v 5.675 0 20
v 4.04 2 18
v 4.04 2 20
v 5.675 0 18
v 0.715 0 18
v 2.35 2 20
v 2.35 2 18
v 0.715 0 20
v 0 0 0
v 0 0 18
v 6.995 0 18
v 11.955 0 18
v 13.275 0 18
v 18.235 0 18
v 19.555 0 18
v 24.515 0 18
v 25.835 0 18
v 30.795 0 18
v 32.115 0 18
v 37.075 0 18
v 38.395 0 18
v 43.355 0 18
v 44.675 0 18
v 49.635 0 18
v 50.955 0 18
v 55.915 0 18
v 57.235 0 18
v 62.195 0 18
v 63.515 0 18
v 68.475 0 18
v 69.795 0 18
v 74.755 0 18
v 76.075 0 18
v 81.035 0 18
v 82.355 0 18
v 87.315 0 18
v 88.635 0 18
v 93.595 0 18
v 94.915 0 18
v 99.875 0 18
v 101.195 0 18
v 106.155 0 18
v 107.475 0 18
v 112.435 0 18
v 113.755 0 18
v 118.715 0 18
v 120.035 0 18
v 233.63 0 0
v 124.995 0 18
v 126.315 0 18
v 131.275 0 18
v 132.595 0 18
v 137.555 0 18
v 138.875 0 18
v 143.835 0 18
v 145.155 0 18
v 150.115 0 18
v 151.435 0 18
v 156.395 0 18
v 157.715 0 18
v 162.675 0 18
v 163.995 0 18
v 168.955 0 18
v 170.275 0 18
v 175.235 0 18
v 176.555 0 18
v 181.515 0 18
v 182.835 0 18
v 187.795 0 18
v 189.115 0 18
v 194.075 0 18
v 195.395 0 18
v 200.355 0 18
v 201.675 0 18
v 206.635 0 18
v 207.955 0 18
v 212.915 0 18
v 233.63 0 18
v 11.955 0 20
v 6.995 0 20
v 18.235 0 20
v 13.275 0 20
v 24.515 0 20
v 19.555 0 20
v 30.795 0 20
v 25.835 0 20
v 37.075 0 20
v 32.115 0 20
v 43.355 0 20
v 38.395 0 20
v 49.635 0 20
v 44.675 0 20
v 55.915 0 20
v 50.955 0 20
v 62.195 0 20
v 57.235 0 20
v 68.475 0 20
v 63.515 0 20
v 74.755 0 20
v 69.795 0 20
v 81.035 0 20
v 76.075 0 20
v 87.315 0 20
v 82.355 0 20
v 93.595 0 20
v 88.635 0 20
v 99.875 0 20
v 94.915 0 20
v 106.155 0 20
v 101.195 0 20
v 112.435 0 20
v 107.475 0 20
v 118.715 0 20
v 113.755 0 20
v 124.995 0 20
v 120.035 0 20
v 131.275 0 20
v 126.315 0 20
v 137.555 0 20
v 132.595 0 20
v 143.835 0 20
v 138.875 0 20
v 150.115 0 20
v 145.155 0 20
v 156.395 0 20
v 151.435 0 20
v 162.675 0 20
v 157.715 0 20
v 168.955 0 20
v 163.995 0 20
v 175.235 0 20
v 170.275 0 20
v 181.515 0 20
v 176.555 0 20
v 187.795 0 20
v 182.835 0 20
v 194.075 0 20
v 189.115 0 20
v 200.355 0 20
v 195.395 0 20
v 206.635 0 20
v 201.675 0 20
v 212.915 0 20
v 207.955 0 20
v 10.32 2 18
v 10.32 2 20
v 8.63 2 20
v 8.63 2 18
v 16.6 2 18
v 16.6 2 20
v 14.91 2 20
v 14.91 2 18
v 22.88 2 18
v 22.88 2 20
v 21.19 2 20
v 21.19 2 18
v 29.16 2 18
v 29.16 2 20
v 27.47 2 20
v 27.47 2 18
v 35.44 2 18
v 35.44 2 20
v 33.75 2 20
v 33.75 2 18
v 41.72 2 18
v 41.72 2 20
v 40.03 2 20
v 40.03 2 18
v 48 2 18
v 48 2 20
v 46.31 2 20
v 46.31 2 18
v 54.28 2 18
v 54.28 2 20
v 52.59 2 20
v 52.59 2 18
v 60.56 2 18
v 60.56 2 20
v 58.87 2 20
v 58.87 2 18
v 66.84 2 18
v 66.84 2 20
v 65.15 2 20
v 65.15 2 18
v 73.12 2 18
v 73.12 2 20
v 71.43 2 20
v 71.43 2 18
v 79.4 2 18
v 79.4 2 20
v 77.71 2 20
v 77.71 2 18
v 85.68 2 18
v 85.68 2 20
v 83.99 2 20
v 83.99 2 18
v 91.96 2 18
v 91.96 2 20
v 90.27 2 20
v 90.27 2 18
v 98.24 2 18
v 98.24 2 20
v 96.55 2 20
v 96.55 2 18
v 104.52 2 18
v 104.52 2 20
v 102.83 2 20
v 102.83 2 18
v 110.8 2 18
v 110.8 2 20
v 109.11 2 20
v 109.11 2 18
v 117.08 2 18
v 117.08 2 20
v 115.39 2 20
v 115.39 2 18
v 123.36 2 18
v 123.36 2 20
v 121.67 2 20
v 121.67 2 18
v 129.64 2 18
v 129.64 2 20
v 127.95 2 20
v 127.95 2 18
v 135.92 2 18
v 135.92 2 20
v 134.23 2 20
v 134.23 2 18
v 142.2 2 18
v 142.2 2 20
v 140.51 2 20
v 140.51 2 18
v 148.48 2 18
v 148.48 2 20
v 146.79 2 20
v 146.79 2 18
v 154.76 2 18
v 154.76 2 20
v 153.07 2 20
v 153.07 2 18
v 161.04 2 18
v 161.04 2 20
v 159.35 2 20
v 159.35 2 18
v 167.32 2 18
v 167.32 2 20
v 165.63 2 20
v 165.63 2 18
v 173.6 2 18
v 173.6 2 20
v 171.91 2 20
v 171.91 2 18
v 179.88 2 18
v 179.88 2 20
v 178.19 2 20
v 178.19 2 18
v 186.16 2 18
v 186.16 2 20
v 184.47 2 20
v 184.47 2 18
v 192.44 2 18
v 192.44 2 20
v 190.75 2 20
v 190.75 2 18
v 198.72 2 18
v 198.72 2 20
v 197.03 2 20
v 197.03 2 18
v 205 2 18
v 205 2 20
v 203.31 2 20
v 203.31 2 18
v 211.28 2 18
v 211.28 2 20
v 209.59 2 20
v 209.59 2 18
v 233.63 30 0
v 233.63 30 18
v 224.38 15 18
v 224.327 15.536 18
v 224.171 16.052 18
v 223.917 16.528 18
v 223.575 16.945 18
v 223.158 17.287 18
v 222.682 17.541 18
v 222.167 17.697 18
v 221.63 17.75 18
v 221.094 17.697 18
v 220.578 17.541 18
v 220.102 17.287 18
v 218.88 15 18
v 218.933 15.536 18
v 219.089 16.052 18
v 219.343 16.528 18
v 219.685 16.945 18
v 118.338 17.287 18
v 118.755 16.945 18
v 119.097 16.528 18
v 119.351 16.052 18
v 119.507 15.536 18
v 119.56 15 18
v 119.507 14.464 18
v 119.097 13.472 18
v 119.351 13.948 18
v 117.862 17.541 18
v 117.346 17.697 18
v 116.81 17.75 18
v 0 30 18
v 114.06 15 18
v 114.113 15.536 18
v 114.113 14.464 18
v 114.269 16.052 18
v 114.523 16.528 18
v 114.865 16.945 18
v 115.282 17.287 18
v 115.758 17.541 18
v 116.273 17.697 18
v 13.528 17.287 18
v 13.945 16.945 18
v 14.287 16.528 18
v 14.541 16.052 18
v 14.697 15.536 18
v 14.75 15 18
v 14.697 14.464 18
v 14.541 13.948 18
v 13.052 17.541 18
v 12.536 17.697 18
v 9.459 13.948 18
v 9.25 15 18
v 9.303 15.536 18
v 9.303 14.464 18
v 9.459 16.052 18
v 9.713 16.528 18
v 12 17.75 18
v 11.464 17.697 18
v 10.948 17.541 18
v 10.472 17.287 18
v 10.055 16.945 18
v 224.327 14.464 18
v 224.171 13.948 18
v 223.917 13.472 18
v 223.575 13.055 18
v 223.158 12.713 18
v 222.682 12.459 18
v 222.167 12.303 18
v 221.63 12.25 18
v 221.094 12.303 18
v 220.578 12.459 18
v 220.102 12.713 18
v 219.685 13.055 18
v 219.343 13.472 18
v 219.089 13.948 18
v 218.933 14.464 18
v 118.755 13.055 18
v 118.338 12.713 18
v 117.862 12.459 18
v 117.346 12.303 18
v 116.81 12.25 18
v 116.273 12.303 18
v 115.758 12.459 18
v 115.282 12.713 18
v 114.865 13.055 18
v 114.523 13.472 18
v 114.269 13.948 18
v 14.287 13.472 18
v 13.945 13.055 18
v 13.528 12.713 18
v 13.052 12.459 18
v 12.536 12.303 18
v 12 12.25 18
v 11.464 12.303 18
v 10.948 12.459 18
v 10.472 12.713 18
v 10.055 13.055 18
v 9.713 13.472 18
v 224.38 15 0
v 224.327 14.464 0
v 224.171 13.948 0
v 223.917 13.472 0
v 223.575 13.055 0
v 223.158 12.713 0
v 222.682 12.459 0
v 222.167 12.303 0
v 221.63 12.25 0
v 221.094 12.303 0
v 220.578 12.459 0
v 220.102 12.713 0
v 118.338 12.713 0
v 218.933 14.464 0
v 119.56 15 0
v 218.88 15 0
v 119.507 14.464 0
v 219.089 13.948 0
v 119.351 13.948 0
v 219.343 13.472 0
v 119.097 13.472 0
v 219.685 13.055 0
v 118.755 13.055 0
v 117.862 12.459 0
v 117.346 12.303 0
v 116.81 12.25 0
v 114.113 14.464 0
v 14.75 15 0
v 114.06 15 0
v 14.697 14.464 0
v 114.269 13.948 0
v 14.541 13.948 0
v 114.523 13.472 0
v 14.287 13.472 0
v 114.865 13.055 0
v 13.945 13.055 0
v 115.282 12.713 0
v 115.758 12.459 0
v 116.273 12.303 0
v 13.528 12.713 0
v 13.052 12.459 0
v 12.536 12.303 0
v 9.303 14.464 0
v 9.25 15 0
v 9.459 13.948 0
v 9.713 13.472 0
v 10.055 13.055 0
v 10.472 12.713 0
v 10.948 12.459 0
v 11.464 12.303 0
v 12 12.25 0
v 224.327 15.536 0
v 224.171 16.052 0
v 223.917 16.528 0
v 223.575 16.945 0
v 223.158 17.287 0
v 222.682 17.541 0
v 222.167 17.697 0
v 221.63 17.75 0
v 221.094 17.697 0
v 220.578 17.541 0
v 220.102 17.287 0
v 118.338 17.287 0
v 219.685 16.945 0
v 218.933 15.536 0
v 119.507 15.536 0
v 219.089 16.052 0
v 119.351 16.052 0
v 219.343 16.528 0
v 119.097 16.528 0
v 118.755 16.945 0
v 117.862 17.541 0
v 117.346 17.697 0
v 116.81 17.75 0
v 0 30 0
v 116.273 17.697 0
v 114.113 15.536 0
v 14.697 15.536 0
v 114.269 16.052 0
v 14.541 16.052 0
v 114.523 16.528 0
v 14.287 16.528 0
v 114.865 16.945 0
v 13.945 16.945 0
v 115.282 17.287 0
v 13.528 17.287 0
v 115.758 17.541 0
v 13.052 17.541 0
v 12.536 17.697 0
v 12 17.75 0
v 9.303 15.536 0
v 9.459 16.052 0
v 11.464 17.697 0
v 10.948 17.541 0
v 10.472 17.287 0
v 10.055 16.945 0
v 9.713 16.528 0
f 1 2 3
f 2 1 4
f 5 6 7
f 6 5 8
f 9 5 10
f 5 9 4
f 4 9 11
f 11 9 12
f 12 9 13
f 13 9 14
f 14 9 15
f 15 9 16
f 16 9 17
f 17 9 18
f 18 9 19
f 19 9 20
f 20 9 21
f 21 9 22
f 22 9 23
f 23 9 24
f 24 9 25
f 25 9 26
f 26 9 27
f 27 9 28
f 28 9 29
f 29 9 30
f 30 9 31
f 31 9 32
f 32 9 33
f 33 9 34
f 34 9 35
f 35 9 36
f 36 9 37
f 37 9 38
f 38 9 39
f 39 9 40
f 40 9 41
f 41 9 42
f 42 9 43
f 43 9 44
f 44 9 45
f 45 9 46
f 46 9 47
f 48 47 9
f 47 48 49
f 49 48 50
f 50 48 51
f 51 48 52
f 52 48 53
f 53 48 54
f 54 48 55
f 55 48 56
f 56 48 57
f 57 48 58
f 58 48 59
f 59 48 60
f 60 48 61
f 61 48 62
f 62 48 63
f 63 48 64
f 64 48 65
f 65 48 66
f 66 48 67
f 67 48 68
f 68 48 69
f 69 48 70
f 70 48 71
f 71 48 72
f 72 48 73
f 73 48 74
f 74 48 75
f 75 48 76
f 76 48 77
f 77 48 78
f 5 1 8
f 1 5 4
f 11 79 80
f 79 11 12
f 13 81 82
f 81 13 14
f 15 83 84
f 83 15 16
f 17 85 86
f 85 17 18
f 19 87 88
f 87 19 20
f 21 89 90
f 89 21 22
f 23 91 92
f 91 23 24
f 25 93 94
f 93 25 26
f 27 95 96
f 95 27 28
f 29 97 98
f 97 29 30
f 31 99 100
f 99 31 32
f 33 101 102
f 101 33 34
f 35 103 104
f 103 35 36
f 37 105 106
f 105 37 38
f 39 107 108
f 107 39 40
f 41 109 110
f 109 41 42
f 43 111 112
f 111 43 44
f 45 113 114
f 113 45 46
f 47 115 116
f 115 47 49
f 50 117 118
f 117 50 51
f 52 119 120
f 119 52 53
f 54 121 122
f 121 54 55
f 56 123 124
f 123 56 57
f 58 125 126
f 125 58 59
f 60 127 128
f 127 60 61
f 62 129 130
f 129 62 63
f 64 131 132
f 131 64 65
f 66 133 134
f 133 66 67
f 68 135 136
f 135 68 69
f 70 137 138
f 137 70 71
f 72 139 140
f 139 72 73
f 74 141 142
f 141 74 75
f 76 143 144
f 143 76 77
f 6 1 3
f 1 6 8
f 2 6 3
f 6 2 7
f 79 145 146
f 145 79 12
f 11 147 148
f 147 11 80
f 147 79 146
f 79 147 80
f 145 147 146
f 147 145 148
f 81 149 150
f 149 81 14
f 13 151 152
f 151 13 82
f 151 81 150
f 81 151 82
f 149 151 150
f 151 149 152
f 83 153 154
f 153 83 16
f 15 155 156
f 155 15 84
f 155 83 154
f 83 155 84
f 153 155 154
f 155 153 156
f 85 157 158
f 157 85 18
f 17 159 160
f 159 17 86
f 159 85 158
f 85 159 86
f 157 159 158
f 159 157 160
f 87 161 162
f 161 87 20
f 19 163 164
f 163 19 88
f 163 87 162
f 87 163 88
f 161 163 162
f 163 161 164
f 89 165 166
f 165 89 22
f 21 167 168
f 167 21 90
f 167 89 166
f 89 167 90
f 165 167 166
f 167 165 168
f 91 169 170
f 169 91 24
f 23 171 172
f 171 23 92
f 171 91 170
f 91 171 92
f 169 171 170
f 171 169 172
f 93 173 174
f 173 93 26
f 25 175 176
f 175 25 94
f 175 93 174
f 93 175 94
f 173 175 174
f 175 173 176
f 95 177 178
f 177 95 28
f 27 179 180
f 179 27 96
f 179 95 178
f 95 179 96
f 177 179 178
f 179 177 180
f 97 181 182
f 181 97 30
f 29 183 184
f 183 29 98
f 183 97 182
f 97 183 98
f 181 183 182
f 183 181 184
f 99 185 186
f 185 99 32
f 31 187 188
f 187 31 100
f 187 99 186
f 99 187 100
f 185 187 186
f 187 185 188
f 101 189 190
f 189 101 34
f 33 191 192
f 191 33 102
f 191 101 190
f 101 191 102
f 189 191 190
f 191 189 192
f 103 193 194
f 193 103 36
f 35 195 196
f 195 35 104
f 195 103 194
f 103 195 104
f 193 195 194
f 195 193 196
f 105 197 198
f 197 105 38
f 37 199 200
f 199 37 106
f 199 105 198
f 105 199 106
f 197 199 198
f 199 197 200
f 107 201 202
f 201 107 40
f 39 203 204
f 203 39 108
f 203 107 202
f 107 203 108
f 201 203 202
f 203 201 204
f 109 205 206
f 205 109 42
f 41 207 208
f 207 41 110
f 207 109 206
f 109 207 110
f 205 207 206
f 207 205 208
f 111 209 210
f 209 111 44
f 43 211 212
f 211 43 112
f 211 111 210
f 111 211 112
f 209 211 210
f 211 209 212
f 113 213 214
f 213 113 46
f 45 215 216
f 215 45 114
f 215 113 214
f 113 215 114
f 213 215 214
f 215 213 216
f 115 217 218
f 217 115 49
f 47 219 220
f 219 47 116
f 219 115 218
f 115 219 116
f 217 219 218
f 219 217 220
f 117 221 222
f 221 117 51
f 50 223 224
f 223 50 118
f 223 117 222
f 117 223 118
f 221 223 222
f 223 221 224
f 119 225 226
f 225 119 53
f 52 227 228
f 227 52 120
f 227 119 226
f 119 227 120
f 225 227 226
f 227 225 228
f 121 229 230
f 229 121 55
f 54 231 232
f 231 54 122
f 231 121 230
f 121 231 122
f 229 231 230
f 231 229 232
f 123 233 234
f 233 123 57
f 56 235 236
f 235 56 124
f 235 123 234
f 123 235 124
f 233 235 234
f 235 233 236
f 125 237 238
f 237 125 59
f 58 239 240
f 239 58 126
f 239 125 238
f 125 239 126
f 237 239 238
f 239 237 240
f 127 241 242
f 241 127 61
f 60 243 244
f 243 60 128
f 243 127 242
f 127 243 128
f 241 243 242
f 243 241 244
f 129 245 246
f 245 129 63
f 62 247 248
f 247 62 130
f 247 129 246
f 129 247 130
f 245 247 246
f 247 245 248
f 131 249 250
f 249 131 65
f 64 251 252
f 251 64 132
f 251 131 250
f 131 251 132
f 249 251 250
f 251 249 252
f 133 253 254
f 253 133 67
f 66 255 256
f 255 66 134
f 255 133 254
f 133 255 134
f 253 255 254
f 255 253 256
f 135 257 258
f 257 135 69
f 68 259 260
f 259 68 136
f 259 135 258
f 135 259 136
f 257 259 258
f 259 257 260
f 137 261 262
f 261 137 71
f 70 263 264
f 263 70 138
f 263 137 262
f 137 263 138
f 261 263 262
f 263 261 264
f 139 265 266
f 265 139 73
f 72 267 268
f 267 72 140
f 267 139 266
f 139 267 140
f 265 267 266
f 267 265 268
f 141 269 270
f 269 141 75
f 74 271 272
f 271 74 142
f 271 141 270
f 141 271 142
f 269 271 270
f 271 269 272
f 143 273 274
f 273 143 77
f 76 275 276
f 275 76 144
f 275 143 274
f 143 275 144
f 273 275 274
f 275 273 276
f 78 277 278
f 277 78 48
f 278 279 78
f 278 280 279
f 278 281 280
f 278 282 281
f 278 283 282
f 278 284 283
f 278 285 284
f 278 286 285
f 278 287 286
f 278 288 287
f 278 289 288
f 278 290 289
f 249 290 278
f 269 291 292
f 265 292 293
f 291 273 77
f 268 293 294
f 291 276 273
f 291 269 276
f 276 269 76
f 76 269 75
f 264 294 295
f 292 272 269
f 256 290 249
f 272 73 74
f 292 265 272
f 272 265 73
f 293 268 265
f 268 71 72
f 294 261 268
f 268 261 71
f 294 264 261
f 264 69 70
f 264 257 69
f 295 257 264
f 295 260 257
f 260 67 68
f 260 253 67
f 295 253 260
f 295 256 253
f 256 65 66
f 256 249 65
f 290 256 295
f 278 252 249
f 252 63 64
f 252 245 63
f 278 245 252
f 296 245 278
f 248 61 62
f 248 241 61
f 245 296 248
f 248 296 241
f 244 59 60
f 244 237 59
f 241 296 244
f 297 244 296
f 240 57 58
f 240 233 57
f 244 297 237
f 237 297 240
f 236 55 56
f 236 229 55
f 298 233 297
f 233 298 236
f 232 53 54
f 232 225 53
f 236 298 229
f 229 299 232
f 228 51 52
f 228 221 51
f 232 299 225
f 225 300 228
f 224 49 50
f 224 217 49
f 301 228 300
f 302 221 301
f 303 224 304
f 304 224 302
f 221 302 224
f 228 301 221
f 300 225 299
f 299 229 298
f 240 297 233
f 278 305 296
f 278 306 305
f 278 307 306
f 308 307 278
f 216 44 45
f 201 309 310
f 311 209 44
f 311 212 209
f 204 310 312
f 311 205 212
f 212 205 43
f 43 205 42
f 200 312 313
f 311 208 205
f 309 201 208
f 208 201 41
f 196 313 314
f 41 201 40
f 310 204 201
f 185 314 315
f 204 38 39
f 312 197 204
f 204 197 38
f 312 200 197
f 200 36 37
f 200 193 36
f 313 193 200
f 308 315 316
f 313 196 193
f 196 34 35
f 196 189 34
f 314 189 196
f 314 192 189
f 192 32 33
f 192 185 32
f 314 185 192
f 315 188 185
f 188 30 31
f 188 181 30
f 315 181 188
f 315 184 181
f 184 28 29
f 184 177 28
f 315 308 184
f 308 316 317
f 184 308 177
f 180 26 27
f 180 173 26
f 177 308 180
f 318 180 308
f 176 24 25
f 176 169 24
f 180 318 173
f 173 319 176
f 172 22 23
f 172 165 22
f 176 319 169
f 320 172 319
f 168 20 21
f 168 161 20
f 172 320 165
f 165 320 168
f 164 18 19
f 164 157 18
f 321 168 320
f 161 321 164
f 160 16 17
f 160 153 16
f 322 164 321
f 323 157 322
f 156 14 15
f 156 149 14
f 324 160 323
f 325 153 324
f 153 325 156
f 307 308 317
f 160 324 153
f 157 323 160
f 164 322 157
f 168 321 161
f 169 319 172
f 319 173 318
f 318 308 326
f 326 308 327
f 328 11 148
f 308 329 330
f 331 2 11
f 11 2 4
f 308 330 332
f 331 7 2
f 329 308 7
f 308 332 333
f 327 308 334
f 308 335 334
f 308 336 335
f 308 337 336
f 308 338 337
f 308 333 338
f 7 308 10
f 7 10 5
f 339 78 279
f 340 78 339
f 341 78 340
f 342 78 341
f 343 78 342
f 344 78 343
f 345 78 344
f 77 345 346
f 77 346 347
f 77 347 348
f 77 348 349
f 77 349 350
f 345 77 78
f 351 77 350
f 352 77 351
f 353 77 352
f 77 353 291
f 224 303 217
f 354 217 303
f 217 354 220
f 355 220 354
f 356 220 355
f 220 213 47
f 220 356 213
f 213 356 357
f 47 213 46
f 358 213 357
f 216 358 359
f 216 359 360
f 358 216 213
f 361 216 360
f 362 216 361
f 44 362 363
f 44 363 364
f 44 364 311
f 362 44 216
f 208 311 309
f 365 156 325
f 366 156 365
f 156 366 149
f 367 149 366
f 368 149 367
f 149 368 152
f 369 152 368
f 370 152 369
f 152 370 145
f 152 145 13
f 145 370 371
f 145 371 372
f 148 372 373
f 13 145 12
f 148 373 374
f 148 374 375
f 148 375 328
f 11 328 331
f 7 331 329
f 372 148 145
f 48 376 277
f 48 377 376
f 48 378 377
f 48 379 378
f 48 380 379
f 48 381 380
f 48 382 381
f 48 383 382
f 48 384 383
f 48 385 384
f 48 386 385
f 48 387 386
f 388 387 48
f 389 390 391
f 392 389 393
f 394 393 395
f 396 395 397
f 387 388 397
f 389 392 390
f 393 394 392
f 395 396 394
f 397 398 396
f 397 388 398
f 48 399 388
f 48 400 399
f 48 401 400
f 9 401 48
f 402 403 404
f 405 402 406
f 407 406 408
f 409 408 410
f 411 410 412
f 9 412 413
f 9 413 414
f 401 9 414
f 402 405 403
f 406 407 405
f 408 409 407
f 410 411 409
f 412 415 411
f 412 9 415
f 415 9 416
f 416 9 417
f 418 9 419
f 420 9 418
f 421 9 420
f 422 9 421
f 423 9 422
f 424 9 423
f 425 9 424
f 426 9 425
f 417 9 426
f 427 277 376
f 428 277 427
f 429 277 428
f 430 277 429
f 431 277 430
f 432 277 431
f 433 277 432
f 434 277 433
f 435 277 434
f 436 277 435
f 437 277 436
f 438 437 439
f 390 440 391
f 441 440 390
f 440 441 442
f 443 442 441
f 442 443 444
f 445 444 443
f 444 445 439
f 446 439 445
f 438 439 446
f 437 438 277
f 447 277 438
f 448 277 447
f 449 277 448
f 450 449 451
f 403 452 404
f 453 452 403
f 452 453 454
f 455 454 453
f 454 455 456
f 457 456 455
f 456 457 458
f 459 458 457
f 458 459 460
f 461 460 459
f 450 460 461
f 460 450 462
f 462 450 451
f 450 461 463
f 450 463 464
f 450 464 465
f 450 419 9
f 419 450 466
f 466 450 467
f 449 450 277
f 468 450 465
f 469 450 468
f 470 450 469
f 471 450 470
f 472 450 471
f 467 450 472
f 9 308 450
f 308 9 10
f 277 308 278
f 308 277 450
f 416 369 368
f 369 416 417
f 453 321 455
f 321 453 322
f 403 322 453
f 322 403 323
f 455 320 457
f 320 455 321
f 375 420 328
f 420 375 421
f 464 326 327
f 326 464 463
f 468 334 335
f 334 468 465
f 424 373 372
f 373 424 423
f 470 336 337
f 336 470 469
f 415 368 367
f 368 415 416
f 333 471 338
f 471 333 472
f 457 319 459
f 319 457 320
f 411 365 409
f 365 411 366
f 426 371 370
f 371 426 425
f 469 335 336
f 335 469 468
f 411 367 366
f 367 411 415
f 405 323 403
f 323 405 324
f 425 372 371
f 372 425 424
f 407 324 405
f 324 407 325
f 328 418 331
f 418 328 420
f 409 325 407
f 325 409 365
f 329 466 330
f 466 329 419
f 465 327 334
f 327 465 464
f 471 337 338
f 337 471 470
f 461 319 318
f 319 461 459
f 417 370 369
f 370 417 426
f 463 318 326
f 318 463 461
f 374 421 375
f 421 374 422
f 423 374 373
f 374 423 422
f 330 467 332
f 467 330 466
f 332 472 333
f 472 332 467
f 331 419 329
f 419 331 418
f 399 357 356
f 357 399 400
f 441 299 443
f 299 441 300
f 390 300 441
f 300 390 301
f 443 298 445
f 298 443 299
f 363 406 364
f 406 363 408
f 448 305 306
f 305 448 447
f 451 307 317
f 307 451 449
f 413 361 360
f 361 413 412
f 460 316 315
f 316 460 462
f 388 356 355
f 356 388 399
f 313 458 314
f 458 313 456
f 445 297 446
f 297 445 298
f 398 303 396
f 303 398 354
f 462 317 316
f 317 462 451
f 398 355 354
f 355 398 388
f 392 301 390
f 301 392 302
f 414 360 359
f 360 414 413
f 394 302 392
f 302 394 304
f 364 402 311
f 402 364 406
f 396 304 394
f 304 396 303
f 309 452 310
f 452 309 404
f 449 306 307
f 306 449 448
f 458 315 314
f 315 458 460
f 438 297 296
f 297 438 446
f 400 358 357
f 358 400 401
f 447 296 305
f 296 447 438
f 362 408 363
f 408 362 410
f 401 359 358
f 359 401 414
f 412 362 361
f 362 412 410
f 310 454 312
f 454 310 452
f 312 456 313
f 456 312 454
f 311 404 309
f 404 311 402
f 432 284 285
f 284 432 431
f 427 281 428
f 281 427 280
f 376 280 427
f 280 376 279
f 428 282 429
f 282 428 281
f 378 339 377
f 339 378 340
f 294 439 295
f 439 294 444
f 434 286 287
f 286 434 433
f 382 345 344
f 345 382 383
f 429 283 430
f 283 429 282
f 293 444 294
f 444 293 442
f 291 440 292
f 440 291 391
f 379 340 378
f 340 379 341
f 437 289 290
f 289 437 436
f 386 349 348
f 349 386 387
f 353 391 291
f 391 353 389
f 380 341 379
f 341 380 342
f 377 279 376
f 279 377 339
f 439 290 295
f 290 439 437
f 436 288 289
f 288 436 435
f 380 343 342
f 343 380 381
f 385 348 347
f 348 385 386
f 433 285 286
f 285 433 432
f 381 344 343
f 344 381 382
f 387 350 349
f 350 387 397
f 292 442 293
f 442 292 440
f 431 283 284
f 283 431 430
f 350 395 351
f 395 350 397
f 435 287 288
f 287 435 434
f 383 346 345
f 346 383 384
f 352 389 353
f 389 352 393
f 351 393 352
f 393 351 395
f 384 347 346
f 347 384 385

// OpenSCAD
$fn = 32;

// ----------------------------------------------------------------------
// Gear rack: m=2 z=34, 233.63 x 30 x 20 mm
// ----------------------------------------------------------------------

// --- parameters (mm) ---
rack_len = 233.63;        // rack length, X
rack_w = 30;              // rack width, Y
rack_h = 20;              // overall height, Z
modul = 2;                // module
body_t = 18;              // tooth root line height
pitch = 6.28;             // circular pitch
tip_w = 1.69;             // tooth thickness at the tip
root_w = 4.96;            // tooth thickness at the root line
hole_d = 5.5;             // mounting hole
sink = 0.6;               // tooth root overlap into the body

tooth_span = 213.63;

module tooth(x0) {
  /* 20 deg flank profile, sunk into the body for a positive overlap */
  translate([x0, 0, body_t - sink])
    linear_extrude(height = rack_h - body_t + sink)
      polygon(points = [[-root_w / 2, 0], [root_w / 2, 0],
                        [tip_w / 2, rack_h - body_t],
                        [-tip_w / 2, rack_h - body_t]]);
}

difference() {
  union() {
    cube([rack_len, rack_w, body_t]);
    for (i = [0 : 34 - 1])
      tooth((i + 0.5) * pitch + (tooth_span - 34 * pitch) / 2);
  }
  translate([12, 15, -1]) cylinder(h = body_t + 2, d = hole_d);
  translate([116.81, 15, -1]) cylinder(h = body_t + 2, d = hole_d);
  translate([221.63, 15, -1]) cylinder(h = body_t + 2, d = hole_d);
}
